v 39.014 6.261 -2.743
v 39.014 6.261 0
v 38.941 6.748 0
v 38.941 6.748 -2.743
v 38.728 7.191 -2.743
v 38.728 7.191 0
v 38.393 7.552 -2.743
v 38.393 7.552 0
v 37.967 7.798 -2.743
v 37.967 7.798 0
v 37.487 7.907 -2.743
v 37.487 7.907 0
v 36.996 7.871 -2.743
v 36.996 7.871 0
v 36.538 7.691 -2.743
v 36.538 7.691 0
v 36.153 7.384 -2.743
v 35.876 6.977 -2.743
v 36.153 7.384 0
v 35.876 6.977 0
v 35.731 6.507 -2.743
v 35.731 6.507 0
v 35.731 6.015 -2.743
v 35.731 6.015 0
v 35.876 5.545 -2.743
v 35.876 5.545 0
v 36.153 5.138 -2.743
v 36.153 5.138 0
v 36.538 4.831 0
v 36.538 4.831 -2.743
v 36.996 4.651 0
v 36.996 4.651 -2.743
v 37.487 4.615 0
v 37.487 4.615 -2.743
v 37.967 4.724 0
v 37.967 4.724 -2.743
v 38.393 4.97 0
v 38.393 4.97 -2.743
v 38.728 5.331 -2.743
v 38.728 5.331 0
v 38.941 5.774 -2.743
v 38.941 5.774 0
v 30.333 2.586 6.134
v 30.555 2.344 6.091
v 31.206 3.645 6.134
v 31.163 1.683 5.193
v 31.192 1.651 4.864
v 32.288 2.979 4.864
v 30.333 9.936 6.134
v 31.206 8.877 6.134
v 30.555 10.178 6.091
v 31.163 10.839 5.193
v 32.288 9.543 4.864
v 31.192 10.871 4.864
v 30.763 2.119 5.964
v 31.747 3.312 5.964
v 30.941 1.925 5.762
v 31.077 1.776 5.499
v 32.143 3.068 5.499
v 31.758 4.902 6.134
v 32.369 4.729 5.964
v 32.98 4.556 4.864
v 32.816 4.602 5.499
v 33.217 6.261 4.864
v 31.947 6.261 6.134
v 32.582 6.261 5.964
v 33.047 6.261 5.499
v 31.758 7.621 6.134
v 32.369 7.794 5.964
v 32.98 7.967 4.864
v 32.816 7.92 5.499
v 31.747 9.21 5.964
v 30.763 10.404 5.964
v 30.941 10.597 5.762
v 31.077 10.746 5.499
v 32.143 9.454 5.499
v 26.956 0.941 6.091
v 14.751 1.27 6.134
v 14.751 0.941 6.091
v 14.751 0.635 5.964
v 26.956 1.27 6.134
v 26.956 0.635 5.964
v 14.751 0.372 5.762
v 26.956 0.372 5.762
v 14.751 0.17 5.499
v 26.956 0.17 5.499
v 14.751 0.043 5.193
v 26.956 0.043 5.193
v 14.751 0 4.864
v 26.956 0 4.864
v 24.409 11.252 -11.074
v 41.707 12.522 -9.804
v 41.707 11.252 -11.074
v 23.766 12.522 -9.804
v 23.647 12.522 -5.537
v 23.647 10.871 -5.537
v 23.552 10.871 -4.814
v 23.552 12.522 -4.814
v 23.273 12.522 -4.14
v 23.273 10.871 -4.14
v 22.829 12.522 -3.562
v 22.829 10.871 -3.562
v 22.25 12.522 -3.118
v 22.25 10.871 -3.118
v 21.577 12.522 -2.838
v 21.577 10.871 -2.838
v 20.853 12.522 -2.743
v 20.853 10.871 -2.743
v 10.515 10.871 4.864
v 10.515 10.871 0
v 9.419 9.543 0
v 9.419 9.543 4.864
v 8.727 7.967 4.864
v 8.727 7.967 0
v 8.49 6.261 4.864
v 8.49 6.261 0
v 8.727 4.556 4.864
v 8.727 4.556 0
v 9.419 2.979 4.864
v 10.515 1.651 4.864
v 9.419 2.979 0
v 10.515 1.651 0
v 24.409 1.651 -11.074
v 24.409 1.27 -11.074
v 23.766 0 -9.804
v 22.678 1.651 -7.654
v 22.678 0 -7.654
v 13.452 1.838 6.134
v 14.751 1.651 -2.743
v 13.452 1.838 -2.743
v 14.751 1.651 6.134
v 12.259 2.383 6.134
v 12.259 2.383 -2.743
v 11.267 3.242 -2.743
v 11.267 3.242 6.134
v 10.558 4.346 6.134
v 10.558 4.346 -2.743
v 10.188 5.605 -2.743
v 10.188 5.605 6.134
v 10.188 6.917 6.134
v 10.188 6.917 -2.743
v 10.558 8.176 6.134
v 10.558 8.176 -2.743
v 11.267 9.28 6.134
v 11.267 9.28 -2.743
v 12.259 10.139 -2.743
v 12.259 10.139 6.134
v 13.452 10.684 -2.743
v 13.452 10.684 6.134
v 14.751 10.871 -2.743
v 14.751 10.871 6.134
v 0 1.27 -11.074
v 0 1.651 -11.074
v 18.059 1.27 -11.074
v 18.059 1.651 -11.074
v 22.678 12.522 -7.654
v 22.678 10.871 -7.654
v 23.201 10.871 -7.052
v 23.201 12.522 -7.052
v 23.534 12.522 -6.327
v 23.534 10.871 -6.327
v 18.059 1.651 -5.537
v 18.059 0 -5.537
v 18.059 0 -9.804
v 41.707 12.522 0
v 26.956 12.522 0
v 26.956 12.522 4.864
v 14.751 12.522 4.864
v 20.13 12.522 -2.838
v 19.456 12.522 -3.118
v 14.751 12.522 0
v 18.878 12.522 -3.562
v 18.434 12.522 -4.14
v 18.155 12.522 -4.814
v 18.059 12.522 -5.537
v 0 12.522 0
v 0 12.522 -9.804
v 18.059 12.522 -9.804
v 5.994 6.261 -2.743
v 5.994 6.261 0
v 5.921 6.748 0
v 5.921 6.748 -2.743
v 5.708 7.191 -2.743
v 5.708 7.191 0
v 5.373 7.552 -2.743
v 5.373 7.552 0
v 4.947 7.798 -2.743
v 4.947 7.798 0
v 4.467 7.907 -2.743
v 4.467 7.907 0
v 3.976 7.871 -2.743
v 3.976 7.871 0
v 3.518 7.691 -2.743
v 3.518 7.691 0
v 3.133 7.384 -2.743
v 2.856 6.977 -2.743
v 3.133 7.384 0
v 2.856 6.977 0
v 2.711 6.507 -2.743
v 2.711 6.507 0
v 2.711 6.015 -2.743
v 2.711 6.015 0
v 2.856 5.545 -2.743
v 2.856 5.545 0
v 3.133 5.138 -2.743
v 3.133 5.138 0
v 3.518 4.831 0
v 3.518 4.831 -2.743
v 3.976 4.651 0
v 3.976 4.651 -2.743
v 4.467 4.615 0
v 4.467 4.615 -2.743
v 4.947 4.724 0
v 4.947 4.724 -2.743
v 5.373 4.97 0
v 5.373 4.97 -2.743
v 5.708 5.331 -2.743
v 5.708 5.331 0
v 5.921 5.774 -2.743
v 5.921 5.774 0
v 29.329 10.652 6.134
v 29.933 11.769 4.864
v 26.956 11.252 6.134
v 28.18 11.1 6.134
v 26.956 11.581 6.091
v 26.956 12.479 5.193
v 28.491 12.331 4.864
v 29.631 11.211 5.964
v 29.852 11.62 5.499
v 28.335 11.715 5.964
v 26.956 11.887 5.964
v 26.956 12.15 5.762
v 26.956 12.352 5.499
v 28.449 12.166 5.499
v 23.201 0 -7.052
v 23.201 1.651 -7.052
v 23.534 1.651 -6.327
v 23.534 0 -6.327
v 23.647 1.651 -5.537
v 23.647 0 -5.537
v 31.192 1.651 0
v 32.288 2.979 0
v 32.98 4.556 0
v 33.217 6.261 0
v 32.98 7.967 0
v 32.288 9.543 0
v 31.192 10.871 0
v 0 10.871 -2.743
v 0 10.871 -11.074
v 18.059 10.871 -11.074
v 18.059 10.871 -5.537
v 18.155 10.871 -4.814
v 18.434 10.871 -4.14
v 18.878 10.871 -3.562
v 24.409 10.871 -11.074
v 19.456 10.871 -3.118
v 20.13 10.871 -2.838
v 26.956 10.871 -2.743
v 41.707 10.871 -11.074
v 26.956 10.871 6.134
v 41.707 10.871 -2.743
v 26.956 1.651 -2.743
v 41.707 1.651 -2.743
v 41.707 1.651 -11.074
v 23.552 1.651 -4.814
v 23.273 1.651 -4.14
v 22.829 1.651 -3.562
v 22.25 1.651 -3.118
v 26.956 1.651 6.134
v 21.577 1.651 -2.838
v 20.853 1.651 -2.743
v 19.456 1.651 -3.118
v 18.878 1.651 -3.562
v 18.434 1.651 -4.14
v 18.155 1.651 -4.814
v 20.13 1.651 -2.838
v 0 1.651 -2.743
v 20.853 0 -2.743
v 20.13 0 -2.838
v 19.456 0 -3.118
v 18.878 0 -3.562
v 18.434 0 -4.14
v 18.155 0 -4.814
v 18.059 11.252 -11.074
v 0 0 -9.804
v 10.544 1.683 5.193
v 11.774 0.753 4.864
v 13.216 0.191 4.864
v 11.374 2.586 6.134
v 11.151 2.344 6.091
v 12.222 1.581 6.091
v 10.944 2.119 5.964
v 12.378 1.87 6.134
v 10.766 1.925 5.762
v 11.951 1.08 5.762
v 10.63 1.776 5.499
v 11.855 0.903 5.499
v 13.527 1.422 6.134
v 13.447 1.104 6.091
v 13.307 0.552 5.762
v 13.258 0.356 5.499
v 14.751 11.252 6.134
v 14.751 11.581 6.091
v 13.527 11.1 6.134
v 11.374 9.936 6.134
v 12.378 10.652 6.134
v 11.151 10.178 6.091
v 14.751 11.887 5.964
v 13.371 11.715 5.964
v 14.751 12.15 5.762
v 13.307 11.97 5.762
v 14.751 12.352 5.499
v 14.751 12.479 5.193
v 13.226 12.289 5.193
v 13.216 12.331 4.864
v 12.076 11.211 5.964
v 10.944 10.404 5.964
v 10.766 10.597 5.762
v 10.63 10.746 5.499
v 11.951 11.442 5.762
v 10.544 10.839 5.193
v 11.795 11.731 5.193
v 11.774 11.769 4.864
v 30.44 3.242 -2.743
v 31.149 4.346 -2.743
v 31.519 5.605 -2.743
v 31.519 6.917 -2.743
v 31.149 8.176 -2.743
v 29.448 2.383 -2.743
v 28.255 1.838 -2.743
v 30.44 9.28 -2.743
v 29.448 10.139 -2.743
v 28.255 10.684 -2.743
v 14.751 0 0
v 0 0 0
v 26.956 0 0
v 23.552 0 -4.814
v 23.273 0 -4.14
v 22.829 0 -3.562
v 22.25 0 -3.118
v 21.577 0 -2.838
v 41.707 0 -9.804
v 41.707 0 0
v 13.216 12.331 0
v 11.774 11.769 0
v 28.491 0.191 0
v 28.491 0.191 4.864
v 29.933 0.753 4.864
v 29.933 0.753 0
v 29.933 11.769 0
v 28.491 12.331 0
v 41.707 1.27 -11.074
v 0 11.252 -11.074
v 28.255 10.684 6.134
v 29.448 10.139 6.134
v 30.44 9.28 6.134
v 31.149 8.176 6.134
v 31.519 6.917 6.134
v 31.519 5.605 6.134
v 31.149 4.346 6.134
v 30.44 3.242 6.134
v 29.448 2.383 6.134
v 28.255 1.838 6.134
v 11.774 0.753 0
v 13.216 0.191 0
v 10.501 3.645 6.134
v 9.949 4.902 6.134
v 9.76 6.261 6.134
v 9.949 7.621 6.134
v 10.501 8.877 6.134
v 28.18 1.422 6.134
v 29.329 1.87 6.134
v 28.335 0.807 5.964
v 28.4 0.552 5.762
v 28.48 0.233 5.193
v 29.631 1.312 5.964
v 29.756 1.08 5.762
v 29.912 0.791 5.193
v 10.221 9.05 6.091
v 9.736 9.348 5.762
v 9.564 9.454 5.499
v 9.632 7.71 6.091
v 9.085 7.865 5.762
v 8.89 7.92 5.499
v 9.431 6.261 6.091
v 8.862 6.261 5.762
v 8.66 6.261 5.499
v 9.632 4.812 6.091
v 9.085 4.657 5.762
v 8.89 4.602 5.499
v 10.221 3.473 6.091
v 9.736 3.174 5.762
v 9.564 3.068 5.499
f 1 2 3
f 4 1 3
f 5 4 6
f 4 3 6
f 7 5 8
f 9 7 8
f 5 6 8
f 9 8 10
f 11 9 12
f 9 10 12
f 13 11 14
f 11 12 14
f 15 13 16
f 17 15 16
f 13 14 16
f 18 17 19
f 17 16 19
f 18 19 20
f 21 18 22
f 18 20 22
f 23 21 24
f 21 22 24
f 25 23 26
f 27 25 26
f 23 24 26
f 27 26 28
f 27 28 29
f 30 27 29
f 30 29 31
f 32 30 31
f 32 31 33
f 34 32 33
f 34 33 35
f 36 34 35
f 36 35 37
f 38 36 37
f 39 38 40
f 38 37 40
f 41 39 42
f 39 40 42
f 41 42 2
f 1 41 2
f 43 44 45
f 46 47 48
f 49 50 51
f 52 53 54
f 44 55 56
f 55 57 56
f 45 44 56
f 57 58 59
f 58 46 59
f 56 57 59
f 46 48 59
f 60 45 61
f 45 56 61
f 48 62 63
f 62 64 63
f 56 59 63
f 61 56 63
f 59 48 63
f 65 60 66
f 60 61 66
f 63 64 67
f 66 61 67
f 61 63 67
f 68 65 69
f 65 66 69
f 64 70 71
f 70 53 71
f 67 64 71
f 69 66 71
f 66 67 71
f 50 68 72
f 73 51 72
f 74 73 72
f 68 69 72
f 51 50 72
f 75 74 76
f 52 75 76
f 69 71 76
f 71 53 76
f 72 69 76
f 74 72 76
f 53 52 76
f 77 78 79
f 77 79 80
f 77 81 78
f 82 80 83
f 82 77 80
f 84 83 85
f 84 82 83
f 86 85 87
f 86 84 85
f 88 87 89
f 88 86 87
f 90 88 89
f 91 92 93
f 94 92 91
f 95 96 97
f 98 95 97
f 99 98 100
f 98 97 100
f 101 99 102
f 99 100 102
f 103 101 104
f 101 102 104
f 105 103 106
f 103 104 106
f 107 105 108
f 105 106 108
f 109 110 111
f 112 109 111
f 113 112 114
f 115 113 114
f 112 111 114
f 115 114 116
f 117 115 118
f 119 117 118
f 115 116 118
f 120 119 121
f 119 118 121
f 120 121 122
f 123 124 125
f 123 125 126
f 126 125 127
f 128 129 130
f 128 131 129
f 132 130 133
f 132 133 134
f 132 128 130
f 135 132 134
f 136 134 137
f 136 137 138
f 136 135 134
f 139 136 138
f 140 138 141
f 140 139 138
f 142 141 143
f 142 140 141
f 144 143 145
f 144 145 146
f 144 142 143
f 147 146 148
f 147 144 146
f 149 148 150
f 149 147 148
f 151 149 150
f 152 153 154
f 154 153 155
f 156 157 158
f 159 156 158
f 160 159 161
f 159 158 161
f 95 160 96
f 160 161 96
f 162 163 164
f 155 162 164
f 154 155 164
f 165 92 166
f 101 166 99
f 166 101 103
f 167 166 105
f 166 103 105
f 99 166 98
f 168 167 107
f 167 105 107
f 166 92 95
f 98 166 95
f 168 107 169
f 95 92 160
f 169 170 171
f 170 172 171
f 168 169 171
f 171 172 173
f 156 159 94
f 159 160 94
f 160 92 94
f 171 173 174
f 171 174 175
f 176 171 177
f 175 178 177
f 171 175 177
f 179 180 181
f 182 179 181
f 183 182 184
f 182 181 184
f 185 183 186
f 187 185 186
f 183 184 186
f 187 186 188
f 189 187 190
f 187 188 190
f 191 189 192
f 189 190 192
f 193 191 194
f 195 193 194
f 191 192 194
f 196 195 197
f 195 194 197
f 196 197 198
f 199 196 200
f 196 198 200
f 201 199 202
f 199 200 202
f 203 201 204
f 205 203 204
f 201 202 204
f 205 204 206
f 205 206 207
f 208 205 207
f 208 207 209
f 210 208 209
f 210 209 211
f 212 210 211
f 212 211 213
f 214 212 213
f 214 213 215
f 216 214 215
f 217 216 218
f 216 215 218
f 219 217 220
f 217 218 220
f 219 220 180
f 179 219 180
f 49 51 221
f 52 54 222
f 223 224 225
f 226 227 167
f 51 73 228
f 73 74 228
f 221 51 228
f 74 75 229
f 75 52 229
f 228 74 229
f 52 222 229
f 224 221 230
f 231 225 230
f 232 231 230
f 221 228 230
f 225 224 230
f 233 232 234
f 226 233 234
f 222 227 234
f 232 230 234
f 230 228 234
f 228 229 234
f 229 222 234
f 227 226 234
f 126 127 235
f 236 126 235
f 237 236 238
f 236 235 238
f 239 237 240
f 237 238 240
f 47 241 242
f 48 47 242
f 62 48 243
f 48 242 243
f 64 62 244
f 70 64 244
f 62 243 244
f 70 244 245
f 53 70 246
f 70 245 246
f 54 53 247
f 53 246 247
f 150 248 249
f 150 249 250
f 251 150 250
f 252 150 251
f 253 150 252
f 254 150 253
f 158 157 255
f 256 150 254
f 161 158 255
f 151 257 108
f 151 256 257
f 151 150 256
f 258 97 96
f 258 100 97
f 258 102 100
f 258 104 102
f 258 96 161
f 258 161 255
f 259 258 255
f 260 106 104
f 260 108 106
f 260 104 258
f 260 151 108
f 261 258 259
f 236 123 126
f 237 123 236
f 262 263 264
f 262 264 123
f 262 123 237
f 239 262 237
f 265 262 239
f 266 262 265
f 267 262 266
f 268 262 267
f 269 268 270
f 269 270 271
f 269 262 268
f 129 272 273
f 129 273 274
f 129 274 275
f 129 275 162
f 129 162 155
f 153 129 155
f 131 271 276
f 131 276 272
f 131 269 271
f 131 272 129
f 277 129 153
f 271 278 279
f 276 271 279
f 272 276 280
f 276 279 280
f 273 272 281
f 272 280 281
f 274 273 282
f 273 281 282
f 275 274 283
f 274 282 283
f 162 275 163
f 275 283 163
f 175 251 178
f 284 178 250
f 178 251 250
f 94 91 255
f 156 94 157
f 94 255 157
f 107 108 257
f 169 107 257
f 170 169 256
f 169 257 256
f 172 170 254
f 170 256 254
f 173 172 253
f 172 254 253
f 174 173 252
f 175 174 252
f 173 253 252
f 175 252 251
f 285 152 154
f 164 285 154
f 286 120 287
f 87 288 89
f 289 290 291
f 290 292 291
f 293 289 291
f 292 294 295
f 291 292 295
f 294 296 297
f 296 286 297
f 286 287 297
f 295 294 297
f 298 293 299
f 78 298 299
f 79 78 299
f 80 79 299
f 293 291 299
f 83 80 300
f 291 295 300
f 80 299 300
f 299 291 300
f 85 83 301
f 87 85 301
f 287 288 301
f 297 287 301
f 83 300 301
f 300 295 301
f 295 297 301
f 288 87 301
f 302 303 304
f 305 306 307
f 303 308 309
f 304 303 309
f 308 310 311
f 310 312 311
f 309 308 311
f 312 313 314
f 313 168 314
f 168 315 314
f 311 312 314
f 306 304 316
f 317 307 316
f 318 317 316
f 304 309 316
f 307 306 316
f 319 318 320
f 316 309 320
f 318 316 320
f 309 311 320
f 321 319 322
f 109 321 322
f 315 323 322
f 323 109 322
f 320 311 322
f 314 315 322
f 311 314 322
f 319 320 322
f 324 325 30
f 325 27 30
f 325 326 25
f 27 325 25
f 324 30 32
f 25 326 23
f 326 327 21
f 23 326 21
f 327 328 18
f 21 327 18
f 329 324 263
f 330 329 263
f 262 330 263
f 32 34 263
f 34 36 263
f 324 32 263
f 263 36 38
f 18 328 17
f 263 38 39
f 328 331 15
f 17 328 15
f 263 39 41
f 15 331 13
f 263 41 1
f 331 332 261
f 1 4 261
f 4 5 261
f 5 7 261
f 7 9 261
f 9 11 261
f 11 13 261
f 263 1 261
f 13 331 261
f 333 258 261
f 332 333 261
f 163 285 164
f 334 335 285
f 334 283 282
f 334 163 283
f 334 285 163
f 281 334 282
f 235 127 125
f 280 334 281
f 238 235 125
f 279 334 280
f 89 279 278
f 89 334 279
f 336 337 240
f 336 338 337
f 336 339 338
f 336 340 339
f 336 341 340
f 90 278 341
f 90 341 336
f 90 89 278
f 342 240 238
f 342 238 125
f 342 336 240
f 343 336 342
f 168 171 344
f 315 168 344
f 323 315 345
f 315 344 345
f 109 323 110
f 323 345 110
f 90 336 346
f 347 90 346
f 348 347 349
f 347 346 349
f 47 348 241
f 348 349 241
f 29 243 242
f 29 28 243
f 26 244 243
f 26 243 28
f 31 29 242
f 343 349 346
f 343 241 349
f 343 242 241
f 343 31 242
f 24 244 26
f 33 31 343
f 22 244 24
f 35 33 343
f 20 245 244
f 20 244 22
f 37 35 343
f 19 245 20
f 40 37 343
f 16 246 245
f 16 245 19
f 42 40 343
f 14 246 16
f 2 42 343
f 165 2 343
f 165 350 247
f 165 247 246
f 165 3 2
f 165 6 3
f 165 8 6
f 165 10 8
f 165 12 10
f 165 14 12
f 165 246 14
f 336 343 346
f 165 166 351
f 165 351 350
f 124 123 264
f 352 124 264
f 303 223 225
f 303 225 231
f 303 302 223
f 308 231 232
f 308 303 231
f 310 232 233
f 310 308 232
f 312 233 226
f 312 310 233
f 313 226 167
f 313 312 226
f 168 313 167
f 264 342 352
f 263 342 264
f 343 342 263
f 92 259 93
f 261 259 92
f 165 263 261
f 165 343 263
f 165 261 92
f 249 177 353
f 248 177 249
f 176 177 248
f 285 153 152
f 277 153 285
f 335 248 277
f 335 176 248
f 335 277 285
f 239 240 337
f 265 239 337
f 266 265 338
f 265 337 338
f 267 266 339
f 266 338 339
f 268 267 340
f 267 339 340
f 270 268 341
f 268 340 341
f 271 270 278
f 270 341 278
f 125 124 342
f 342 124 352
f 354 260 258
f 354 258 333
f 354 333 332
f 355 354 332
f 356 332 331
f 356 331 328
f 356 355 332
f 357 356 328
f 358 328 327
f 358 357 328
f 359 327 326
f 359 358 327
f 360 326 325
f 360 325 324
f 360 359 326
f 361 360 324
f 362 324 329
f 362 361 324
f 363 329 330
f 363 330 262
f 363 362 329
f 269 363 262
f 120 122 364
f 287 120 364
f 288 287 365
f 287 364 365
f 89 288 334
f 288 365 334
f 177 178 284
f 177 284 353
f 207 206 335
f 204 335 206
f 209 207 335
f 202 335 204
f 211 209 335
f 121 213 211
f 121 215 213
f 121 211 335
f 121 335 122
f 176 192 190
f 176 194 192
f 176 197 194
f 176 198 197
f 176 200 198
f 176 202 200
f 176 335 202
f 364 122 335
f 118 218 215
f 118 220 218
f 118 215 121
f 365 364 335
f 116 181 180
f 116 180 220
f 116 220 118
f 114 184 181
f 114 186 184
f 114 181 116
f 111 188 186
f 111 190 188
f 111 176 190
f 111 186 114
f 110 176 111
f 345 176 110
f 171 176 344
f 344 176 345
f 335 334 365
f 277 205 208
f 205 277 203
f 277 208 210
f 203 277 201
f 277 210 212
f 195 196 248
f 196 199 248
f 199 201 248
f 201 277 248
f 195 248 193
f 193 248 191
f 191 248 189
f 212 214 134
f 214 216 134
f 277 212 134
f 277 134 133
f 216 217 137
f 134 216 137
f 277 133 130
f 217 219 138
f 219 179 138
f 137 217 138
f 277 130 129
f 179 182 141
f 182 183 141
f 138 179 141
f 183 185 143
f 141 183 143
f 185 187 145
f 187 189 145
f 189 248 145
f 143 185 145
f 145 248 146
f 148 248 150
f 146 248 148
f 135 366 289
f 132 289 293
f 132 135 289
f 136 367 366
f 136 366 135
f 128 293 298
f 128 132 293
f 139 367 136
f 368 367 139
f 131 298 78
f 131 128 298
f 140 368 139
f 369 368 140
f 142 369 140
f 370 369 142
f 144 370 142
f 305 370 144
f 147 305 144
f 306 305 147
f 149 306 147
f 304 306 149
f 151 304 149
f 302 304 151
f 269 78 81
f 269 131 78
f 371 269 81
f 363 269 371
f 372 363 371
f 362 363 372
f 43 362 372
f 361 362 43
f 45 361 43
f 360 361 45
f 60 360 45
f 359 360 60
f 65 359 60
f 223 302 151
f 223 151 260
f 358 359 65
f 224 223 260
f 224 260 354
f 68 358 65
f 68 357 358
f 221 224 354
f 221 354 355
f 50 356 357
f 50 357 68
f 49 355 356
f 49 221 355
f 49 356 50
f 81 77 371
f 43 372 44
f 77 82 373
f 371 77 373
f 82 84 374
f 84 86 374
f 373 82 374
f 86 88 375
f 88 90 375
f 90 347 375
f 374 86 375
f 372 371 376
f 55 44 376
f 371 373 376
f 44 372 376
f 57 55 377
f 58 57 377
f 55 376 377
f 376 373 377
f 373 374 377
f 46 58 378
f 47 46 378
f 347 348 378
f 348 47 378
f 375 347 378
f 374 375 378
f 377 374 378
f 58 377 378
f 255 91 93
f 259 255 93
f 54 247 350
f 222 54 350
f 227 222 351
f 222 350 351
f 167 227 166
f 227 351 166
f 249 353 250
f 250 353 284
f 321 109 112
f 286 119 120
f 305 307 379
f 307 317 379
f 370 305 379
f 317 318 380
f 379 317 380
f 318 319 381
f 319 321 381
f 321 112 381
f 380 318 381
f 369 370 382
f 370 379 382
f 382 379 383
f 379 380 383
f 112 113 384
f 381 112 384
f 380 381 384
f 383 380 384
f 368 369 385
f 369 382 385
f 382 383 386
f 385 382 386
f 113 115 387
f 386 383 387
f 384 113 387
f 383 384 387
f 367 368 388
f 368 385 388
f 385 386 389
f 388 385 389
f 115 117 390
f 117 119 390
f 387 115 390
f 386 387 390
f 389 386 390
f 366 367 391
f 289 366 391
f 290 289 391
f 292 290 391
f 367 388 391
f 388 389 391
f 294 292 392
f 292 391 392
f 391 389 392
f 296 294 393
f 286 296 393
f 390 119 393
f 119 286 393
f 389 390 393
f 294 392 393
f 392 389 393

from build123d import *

# Parameters (mm, degrees)
F1_DEPTH = 6.1341
F2_DEPTH = 11.0744
F0_R     = 1.651
F3_DEPTH = 2.7432
F5_DEPTH = 12.5232
F6_SIZE  = 1.27
F7_R     = 1.27


with BuildPart() as f1:
    # F0 (on Top) → F1 (new body)
    with BuildSketch(Plane.XY):
        with BuildLine():
            Line((14.75105, 1.651), (10.514501, 1.651))
            ThreePointArc((10.514501, 1.651), (12.477608, 0.427333), (14.75105, 0))
            Line((14.75105, 0), (20.8534, 0))
            Line((20.8534, 0), (26.95575, 0))
            ThreePointArc((26.95575, 0), (29.229192, 0.427333), (31.192299, 1.651))
            Line((31.192299, 1.651), (26.95575, 1.651))
            Line((26.95575, 1.651), (20.8534, 1.651))
            Line((20.8534, 1.651), (14.75105, 1.651))
        make_face()
        with BuildLine():
            Line((14.75105, 10.8712), (10.514501, 10.8712))
            ThreePointArc((10.514501, 10.8712), (8.48995, 6.2611), (10.514501, 1.651))
            Line((10.514501, 1.651), (14.75105, 1.651))
            ThreePointArc((14.75105, 1.651), (10.14095, 6.2611), (14.75105, 10.8712))
        make_face()
        with BuildLine():
            Line((20.8534, 12.5222), (14.75105, 12.5222))
            ThreePointArc((14.75105, 12.5222), (12.477608, 12.094867), (10.514501, 10.8712))
            Line((10.514501, 10.8712), (14.75105, 10.8712))
            Line((14.75105, 10.8712), (20.8534, 10.8712))
            Line((20.8534, 10.8712), (26.95575, 10.8712))
            Line((26.95575, 10.8712), (31.192299, 10.8712))
            ThreePointArc((31.192299, 10.8712), (29.229192, 12.094867), (26.95575, 12.5222))
            Line((26.95575, 12.5222), (20.8534, 12.5222))
        make_face()
        with BuildLine():
            ThreePointArc((31.192299, 1.651), (33.21685, 6.2611), (31.192299, 10.8712))
            Line((31.192299, 10.8712), (26.95575, 10.8712))
            ThreePointArc((26.95575, 10.8712), (31.56585, 6.2611), (26.95575, 1.651))
            Line((26.95575, 1.651), (31.192299, 1.651))
        make_face()
    extrude(amount=F1_DEPTH)

    # F0 (on Top) → F2 (join)
    with BuildSketch(Plane.XY):
        with BuildLine():
            Line((10.514501, 1.651), (0, 1.651))
            Line((0, 1.651), (0, 0))
            Line((0, 0), (14.75105, 0))
            ThreePointArc((14.75105, 0), (12.477608, 0.427333), (10.514501, 1.651))
        make_face()
        with BuildLine():
            Line((14.75105, 1.651), (10.514501, 1.651))
            ThreePointArc((10.514501, 1.651), (12.477608, 0.427333), (14.75105, 0))
            Line((14.75105, 0), (20.8534, 0))
            Line((20.8534, 0), (26.95575, 0))
            ThreePointArc((26.95575, 0), (29.229192, 0.427333), (31.192299, 1.651))
            Line((31.192299, 1.651), (26.95575, 1.651))
            Line((26.95575, 1.651), (20.8534, 1.651))
            Line((20.8534, 1.651), (14.75105, 1.651))
        make_face()
        with BuildLine():
            Line((41.7068, 1.651), (31.192299, 1.651))
            ThreePointArc((31.192299, 1.651), (29.229192, 0.427333), (26.95575, 0))
            Line((26.95575, 0), (41.7068, 0))
            Line((41.7068, 0), (41.7068, 1.651))
        make_face()
        with BuildLine():
            Line((14.75105, 12.5222), (0, 12.5222))
            Line((0, 12.5222), (0, 10.8712))
            Line((0, 10.8712), (10.514501, 10.8712))
            ThreePointArc((10.514501, 10.8712), (12.477608, 12.094867), (14.75105, 12.5222))
        make_face()
        with BuildLine():
            Line((20.8534, 12.5222), (14.75105, 12.5222))
            ThreePointArc((14.75105, 12.5222), (12.477608, 12.094867), (10.514501, 10.8712))
            Line((10.514501, 10.8712), (14.75105, 10.8712))
            Line((14.75105, 10.8712), (20.8534, 10.8712))
            Line((20.8534, 10.8712), (26.95575, 10.8712))
            Line((26.95575, 10.8712), (31.192299, 10.8712))
            ThreePointArc((31.192299, 10.8712), (29.229192, 12.094867), (26.95575, 12.5222))
            Line((26.95575, 12.5222), (20.8534, 12.5222))
        make_face()
        with BuildLine():
            Line((41.7068, 12.5222), (26.95575, 12.5222))
            ThreePointArc((26.95575, 12.5222), (29.229192, 12.094867), (31.192299, 10.8712))
            Line((31.192299, 10.8712), (41.7068, 10.8712))
            Line((41.7068, 10.8712), (41.7068, 12.5222))
        make_face()
    extrude(amount=-F2_DEPTH)

    # F0 (on Top) → F3 (join)
    with BuildSketch(Plane.XY):
        with BuildLine():
            Line((14.75105, 10.8712), (10.514501, 10.8712))
            ThreePointArc((10.514501, 10.8712), (8.48995, 6.2611), (10.514501, 1.651))
            Line((10.514501, 1.651), (14.75105, 1.651))
            ThreePointArc((14.75105, 1.651), (10.14095, 6.2611), (14.75105, 10.8712))
        make_face()
        with BuildLine():
            Line((10.514501, 10.8712), (0, 10.8712))
            Line((0, 10.8712), (0, 1.651))
            Line((0, 1.651), (10.514501, 1.651))
            ThreePointArc((10.514501, 1.651), (8.48995, 6.2611), (10.514501, 10.8712))
        make_face()
        with Locations((4.3434, 6.2611)):
            Circle(F0_R, mode=Mode.SUBTRACT)
        with BuildLine():
            ThreePointArc((31.192299, 1.651), (33.21685, 6.2611), (31.192299, 10.8712))
            Line((31.192299, 10.8712), (26.95575, 10.8712))
            ThreePointArc((26.95575, 10.8712), (31.56585, 6.2611), (26.95575, 1.651))
            Line((26.95575, 1.651), (31.192299, 1.651))
        make_face()
        with BuildLine():
            Line((41.7068, 10.8712), (31.192299, 10.8712))
            ThreePointArc((31.192299, 10.8712), (33.21685, 6.2611), (31.192299, 1.651))
            Line((31.192299, 1.651), (41.7068, 1.651))
            Line((41.7068, 1.651), (41.7068, 10.8712))
        make_face()
        with Locations((37.3634, 6.2611)):
            Circle(F0_R, mode=Mode.SUBTRACT)
    extrude(amount=-F3_DEPTH)

    # F4 (on Front) → F5 (cut, through all)
    with BuildSketch(Plane.XZ):
        with BuildLine():
            ThreePointArc((23.6474, -5.5372), (22.829056, -3.561544), (20.8534, -2.7432))
            ThreePointArc((20.8534, -2.7432), (18.877744, -3.561544), (18.0594, -5.5372))
            Line((18.0594, -5.5372), (22.677582, -7.653517))
            ThreePointArc((22.677582, -7.653517), (23.3934, -6.701174), (23.6474, -5.5372))
        make_face()
        with BuildLine():
            Line((22.677582, -7.653517), (18.0594, -5.5372))
            ThreePointArc((18.0594, -5.5372), (19.689426, -8.0772), (22.677582, -7.653517))
        make_face()
        with BuildLine():
            Line((18.0594, -5.5372), (18.0594, -11.0744))
            Line((18.0594, -11.0744), (24.4094, -11.0744))
            Line((24.4094, -11.0744), (22.677582, -7.653517))
            ThreePointArc((22.677582, -7.653517), (19.689426, -8.0772), (18.0594, -5.5372))
        make_face()
    extrude(amount=-F5_DEPTH, mode=Mode.SUBTRACT)

    # F6
    f6_edges = [f1.edges().sort_by_distance(p)[0] for p in [
        (33.0581, 0, -11.0744),
        (9.0297, 0, -11.0744),
        (33.0581, 12.5222, -11.0744),
        (9.0297, 12.5222, -11.0744),
    ]]
    chamfer(f6_edges, length=F6_SIZE)

    # F7
    f7_edges = [f1.edges().sort_by_distance(p)[0] for p in [
        (33.21685, 6.2611, 6.1341),
        (20.8534, 12.5222, 6.1341),
    ]]
    fillet(f7_edges, radius=F7_R)


solid = f1.part
